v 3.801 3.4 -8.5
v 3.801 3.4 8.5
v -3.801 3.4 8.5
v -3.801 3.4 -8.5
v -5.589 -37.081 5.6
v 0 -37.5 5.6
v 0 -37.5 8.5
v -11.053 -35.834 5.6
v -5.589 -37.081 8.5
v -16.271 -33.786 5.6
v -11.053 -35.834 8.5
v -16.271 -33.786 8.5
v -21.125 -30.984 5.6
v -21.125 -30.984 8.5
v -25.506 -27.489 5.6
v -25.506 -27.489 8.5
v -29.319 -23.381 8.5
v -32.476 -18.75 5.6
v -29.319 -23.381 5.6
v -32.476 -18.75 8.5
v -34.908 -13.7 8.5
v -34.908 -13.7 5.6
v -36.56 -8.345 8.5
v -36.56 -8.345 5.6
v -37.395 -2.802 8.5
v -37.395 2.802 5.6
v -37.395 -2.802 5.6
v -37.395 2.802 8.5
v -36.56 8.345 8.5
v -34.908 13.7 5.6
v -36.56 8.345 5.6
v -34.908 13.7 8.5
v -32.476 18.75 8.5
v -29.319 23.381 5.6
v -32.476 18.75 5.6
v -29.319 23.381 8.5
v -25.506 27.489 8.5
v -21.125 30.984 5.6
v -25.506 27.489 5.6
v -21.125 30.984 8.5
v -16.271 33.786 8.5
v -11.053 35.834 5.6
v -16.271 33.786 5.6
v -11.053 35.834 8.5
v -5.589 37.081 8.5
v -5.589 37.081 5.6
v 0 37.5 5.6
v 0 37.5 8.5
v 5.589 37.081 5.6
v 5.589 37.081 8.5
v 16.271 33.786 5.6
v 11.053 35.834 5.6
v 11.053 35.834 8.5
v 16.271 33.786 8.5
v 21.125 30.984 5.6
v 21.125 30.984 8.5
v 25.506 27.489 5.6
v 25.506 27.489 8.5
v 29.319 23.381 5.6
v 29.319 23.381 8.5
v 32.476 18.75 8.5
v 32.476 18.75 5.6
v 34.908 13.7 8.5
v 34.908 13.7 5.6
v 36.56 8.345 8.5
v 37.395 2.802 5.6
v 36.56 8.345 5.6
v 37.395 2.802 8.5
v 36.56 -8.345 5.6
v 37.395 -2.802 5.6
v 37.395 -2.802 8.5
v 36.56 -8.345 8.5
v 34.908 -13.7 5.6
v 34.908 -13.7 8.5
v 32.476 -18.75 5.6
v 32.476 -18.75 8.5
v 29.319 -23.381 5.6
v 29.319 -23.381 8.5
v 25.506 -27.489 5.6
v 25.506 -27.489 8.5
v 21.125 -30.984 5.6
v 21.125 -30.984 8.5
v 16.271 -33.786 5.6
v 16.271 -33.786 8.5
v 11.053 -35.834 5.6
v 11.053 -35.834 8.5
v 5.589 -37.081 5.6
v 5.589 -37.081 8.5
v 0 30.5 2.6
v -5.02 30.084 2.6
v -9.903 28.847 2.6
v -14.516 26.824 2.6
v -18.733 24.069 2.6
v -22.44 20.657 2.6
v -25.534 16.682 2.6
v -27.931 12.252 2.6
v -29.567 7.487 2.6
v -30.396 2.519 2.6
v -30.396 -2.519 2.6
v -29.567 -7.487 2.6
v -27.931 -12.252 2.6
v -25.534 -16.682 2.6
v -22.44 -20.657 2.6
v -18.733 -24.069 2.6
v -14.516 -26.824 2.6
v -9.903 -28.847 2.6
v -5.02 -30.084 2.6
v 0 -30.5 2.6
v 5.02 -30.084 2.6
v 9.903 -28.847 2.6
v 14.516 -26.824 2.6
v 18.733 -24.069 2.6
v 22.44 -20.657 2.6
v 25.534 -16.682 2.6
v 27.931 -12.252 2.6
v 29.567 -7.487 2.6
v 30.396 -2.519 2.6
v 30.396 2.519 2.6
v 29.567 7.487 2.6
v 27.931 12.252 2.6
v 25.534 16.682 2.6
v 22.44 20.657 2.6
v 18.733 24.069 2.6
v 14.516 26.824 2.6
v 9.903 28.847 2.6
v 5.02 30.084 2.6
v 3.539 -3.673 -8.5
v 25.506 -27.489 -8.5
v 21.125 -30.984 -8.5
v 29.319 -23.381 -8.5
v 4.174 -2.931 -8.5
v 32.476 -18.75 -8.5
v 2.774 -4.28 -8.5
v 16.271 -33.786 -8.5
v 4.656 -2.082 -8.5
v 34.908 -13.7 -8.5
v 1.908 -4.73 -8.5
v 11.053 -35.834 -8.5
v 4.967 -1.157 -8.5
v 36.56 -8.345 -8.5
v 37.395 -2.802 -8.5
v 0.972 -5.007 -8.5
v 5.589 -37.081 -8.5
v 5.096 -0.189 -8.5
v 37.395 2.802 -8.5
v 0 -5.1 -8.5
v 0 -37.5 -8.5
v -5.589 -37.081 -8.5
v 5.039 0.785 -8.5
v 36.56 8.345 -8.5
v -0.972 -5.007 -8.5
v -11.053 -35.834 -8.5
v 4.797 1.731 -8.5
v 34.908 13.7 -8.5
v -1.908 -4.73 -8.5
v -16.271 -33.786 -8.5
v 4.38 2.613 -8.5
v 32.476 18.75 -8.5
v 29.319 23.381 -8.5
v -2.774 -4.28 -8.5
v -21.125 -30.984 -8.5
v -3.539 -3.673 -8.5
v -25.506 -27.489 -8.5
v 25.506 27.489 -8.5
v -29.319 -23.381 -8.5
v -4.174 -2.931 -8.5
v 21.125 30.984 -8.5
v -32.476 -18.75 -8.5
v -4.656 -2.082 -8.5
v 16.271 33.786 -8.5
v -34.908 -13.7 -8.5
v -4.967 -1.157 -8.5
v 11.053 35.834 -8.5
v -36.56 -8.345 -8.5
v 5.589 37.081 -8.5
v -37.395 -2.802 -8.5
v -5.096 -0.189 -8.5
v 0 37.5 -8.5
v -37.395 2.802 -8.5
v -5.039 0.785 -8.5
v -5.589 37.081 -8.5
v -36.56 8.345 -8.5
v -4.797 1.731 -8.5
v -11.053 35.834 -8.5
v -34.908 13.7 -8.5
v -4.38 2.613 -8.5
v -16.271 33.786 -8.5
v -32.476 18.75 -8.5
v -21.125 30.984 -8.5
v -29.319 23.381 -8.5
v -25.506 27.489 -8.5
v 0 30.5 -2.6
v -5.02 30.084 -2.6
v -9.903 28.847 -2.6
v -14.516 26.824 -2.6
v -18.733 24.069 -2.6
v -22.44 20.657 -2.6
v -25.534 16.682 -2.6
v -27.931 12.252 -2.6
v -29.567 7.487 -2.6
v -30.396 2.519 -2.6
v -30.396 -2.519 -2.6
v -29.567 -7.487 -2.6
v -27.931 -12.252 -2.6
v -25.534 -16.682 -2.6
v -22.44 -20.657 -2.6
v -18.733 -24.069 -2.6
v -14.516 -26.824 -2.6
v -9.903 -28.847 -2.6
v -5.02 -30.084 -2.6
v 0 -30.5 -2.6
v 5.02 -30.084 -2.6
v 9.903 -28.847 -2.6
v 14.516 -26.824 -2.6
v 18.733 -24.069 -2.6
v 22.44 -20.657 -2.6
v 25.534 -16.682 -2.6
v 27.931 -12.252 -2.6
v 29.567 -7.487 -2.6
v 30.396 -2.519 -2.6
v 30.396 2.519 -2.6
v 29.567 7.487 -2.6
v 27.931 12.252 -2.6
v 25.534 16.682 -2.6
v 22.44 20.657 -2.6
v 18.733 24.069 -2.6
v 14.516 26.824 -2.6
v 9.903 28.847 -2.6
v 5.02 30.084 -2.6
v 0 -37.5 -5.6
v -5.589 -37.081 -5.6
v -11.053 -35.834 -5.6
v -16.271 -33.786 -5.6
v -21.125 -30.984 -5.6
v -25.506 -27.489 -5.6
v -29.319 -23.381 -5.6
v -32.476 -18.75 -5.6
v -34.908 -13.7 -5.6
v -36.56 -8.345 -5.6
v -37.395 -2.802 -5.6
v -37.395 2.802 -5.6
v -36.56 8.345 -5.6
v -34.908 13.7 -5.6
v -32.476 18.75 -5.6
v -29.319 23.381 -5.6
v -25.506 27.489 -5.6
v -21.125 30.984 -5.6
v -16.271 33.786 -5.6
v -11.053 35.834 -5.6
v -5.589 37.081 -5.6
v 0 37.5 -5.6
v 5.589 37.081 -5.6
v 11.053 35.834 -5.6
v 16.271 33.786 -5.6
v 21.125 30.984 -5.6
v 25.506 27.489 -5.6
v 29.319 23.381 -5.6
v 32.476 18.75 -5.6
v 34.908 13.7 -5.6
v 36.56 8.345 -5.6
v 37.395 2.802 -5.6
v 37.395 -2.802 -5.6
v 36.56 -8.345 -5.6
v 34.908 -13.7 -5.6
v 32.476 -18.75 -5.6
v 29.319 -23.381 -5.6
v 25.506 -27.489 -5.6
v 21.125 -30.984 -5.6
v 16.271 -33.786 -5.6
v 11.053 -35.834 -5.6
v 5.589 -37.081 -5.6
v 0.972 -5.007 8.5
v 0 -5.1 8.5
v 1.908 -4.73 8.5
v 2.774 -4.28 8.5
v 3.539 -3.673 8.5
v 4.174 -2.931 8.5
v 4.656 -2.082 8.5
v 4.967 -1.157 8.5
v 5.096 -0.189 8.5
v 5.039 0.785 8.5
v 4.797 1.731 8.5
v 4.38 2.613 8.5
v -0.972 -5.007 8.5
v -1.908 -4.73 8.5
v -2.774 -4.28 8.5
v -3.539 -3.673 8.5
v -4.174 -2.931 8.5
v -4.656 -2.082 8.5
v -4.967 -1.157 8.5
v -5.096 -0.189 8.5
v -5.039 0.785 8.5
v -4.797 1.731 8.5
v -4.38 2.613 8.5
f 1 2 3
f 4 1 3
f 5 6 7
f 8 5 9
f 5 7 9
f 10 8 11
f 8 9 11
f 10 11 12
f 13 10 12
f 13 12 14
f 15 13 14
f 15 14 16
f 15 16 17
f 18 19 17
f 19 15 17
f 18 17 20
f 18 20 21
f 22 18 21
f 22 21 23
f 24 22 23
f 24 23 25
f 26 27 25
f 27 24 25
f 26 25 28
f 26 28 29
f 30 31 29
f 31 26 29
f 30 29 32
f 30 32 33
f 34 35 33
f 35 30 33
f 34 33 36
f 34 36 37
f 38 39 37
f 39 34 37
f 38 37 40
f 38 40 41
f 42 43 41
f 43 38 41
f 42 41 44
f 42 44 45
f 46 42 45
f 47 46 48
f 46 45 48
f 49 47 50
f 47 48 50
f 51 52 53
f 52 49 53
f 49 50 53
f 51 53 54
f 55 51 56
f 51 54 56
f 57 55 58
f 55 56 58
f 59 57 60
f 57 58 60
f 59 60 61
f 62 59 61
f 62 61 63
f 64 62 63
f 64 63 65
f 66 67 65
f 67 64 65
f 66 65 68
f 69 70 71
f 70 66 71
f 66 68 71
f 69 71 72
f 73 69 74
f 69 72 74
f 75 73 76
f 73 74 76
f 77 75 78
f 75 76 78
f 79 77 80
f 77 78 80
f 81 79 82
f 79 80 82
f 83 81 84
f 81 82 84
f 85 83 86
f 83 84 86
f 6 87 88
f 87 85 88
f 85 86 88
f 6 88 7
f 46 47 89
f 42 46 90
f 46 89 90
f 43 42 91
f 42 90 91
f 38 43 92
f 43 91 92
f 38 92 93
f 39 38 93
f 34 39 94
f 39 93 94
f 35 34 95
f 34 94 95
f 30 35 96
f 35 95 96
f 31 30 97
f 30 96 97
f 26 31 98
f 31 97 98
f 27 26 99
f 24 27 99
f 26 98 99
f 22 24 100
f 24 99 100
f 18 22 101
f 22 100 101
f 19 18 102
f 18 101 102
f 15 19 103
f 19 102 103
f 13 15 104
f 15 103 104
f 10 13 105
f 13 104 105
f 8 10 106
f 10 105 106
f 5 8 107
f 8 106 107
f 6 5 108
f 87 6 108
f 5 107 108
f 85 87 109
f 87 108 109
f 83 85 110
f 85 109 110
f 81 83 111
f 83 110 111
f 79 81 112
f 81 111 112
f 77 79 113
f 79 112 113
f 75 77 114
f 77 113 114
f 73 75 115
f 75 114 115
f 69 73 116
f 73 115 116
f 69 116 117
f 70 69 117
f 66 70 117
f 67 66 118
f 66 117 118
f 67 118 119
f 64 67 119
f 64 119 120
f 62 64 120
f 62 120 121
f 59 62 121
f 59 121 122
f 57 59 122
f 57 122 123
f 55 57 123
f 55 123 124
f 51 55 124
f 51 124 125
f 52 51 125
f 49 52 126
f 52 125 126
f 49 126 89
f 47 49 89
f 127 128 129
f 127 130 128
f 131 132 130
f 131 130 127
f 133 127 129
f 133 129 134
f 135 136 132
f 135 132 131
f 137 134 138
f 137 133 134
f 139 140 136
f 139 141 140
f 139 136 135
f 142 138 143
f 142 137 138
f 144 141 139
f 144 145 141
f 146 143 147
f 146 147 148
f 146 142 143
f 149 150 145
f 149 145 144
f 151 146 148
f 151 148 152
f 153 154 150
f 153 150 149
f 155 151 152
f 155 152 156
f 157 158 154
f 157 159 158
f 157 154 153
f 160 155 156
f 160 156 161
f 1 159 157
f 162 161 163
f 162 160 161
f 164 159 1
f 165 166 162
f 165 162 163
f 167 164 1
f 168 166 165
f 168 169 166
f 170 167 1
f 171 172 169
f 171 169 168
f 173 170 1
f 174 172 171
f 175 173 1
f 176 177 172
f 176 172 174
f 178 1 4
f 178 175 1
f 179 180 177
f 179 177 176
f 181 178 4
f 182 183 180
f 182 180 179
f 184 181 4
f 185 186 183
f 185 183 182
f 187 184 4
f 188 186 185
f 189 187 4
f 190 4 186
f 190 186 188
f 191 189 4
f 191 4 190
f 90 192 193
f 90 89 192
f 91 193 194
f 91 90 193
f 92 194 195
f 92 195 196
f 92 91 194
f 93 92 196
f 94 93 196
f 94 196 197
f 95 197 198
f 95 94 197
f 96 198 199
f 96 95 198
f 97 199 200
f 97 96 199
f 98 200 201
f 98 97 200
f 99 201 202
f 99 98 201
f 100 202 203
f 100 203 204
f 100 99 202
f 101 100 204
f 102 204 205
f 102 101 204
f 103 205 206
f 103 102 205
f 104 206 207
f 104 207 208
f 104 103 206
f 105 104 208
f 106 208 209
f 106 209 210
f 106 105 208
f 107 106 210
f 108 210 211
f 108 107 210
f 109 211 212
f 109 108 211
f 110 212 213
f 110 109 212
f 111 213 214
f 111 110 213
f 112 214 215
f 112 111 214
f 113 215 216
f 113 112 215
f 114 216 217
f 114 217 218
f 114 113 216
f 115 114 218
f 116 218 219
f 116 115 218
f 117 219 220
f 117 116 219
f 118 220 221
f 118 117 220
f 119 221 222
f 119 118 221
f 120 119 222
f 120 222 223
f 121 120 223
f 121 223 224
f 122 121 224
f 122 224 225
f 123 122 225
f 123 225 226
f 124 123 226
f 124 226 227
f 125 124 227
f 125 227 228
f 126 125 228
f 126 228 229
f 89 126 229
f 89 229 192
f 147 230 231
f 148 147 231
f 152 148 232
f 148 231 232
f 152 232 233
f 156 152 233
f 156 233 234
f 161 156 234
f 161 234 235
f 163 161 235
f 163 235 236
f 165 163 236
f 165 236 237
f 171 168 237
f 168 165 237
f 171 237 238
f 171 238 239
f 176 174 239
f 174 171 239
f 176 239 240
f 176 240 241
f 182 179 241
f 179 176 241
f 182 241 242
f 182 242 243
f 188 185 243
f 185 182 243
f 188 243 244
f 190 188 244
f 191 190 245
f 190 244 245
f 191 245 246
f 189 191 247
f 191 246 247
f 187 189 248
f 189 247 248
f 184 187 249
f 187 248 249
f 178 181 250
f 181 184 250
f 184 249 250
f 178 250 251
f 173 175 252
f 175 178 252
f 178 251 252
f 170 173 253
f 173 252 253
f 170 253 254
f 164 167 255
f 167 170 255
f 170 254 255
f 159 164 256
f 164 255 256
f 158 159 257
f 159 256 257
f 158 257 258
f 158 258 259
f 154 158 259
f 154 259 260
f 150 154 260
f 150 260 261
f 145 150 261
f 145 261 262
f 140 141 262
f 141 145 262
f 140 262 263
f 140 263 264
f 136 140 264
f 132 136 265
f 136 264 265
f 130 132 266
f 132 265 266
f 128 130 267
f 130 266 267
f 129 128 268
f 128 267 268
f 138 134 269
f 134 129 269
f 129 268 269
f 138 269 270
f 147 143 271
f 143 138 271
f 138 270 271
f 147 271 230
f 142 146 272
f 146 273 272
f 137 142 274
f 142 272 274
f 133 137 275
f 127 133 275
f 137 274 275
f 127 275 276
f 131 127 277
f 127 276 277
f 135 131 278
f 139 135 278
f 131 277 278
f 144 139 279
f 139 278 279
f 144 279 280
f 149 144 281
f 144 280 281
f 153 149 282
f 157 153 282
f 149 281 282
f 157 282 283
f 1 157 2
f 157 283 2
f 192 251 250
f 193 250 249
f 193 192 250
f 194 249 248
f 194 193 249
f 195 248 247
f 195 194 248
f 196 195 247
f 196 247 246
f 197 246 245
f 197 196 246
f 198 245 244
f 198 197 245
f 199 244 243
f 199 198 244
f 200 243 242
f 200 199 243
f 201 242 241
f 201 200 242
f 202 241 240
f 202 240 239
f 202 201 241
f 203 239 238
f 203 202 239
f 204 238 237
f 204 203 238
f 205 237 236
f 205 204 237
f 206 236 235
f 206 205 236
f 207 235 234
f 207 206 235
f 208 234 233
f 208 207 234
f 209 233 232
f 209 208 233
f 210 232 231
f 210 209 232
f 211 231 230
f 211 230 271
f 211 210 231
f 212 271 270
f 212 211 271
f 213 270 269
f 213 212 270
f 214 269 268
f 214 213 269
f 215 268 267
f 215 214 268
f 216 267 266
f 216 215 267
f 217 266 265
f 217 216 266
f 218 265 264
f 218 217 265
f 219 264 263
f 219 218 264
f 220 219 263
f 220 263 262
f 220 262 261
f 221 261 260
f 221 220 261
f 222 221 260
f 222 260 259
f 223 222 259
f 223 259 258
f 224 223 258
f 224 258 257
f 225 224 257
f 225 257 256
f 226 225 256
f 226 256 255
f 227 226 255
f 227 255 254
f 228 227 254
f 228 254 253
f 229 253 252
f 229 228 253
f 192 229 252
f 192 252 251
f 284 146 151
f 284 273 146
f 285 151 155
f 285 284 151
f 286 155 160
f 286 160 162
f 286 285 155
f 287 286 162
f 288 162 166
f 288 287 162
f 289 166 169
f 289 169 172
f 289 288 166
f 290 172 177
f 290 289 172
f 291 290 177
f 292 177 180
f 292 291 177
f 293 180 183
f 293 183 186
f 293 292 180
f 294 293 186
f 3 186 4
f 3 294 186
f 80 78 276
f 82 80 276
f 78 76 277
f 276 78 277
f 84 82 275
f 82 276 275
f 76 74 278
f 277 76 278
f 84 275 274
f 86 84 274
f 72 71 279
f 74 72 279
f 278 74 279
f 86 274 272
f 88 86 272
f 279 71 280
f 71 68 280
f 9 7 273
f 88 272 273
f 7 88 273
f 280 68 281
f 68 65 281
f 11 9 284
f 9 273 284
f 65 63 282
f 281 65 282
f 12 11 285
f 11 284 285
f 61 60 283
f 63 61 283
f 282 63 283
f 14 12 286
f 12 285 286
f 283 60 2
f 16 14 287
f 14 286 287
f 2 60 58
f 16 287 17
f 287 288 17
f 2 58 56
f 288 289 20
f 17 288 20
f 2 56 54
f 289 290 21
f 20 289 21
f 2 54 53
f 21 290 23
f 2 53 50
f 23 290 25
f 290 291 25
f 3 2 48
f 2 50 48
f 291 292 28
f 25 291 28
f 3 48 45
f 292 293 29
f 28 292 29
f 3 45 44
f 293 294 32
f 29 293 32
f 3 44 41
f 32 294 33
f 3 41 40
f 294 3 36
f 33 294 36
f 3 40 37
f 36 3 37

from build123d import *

# Parameters (mm, degrees)
PAD_DEPTH         = 8.5
SKETCH003_R       = 109.254571
SKETCH003_R_2     = 59.25
POCKET_DEPTH      = 8.501
POCKET_DEPTH_BACK = -8.501


with BuildPart() as part:
    # Sketch → Pad (new body, symmetric)
    with BuildSketch(Plane.XY):
        with BuildLine():
            ThreePointArc((0, -37.5), (37.5, 0), (0, 37.5))
            Line((0, 37.5), (0, 5.8))
            Line((0, 5.8), (0, 5.1))
            Line((0, 3.4), (0, 5.1))
            Line((0, 3.4), (3.801316, 3.4))
            ThreePointArc((0, -5.1), (4.655642, -2.082066), (3.801316, 3.4))
            Line((0, -5.1), (0, -37.5))
        make_face()
    pad = extrude(amount=PAD_DEPTH, both=True)

    # Mirrored: Pad across Sketch V_Axis
    add(pad.mirror(Plane(origin=(0, 0, 0), x_dir=(0, 0, 1), z_dir=(1, 0, 0))))

    # Sketch001 → Groove (revolve, cut)
    with BuildSketch(Plane.YZ):
        Polygon((37.5, 0), (37.5, 5.6), (30.5, 2.6), (30.5, 0), align=None)
    groove = revolve(axis=Axis((0, 0, 0), (0, 0, 1)), mode=Mode.SUBTRACT)

    # Mirrored001: Groove across Sketch001 H_Axis
    add(groove.mirror(Plane.XY), mode=Mode.SUBTRACT)

    # Sketch003 → Pocket (cut, two sides)
    with BuildSketch(Plane.XY) as pocket_sk:
        Circle(SKETCH003_R)
        Circle(SKETCH003_R_2, mode=Mode.SUBTRACT)
    extrude(amount=-POCKET_DEPTH, mode=Mode.SUBTRACT)
    extrude(pocket_sk.sketch, amount=-POCKET_DEPTH_BACK, mode=Mode.SUBTRACT)


solid = part.part
